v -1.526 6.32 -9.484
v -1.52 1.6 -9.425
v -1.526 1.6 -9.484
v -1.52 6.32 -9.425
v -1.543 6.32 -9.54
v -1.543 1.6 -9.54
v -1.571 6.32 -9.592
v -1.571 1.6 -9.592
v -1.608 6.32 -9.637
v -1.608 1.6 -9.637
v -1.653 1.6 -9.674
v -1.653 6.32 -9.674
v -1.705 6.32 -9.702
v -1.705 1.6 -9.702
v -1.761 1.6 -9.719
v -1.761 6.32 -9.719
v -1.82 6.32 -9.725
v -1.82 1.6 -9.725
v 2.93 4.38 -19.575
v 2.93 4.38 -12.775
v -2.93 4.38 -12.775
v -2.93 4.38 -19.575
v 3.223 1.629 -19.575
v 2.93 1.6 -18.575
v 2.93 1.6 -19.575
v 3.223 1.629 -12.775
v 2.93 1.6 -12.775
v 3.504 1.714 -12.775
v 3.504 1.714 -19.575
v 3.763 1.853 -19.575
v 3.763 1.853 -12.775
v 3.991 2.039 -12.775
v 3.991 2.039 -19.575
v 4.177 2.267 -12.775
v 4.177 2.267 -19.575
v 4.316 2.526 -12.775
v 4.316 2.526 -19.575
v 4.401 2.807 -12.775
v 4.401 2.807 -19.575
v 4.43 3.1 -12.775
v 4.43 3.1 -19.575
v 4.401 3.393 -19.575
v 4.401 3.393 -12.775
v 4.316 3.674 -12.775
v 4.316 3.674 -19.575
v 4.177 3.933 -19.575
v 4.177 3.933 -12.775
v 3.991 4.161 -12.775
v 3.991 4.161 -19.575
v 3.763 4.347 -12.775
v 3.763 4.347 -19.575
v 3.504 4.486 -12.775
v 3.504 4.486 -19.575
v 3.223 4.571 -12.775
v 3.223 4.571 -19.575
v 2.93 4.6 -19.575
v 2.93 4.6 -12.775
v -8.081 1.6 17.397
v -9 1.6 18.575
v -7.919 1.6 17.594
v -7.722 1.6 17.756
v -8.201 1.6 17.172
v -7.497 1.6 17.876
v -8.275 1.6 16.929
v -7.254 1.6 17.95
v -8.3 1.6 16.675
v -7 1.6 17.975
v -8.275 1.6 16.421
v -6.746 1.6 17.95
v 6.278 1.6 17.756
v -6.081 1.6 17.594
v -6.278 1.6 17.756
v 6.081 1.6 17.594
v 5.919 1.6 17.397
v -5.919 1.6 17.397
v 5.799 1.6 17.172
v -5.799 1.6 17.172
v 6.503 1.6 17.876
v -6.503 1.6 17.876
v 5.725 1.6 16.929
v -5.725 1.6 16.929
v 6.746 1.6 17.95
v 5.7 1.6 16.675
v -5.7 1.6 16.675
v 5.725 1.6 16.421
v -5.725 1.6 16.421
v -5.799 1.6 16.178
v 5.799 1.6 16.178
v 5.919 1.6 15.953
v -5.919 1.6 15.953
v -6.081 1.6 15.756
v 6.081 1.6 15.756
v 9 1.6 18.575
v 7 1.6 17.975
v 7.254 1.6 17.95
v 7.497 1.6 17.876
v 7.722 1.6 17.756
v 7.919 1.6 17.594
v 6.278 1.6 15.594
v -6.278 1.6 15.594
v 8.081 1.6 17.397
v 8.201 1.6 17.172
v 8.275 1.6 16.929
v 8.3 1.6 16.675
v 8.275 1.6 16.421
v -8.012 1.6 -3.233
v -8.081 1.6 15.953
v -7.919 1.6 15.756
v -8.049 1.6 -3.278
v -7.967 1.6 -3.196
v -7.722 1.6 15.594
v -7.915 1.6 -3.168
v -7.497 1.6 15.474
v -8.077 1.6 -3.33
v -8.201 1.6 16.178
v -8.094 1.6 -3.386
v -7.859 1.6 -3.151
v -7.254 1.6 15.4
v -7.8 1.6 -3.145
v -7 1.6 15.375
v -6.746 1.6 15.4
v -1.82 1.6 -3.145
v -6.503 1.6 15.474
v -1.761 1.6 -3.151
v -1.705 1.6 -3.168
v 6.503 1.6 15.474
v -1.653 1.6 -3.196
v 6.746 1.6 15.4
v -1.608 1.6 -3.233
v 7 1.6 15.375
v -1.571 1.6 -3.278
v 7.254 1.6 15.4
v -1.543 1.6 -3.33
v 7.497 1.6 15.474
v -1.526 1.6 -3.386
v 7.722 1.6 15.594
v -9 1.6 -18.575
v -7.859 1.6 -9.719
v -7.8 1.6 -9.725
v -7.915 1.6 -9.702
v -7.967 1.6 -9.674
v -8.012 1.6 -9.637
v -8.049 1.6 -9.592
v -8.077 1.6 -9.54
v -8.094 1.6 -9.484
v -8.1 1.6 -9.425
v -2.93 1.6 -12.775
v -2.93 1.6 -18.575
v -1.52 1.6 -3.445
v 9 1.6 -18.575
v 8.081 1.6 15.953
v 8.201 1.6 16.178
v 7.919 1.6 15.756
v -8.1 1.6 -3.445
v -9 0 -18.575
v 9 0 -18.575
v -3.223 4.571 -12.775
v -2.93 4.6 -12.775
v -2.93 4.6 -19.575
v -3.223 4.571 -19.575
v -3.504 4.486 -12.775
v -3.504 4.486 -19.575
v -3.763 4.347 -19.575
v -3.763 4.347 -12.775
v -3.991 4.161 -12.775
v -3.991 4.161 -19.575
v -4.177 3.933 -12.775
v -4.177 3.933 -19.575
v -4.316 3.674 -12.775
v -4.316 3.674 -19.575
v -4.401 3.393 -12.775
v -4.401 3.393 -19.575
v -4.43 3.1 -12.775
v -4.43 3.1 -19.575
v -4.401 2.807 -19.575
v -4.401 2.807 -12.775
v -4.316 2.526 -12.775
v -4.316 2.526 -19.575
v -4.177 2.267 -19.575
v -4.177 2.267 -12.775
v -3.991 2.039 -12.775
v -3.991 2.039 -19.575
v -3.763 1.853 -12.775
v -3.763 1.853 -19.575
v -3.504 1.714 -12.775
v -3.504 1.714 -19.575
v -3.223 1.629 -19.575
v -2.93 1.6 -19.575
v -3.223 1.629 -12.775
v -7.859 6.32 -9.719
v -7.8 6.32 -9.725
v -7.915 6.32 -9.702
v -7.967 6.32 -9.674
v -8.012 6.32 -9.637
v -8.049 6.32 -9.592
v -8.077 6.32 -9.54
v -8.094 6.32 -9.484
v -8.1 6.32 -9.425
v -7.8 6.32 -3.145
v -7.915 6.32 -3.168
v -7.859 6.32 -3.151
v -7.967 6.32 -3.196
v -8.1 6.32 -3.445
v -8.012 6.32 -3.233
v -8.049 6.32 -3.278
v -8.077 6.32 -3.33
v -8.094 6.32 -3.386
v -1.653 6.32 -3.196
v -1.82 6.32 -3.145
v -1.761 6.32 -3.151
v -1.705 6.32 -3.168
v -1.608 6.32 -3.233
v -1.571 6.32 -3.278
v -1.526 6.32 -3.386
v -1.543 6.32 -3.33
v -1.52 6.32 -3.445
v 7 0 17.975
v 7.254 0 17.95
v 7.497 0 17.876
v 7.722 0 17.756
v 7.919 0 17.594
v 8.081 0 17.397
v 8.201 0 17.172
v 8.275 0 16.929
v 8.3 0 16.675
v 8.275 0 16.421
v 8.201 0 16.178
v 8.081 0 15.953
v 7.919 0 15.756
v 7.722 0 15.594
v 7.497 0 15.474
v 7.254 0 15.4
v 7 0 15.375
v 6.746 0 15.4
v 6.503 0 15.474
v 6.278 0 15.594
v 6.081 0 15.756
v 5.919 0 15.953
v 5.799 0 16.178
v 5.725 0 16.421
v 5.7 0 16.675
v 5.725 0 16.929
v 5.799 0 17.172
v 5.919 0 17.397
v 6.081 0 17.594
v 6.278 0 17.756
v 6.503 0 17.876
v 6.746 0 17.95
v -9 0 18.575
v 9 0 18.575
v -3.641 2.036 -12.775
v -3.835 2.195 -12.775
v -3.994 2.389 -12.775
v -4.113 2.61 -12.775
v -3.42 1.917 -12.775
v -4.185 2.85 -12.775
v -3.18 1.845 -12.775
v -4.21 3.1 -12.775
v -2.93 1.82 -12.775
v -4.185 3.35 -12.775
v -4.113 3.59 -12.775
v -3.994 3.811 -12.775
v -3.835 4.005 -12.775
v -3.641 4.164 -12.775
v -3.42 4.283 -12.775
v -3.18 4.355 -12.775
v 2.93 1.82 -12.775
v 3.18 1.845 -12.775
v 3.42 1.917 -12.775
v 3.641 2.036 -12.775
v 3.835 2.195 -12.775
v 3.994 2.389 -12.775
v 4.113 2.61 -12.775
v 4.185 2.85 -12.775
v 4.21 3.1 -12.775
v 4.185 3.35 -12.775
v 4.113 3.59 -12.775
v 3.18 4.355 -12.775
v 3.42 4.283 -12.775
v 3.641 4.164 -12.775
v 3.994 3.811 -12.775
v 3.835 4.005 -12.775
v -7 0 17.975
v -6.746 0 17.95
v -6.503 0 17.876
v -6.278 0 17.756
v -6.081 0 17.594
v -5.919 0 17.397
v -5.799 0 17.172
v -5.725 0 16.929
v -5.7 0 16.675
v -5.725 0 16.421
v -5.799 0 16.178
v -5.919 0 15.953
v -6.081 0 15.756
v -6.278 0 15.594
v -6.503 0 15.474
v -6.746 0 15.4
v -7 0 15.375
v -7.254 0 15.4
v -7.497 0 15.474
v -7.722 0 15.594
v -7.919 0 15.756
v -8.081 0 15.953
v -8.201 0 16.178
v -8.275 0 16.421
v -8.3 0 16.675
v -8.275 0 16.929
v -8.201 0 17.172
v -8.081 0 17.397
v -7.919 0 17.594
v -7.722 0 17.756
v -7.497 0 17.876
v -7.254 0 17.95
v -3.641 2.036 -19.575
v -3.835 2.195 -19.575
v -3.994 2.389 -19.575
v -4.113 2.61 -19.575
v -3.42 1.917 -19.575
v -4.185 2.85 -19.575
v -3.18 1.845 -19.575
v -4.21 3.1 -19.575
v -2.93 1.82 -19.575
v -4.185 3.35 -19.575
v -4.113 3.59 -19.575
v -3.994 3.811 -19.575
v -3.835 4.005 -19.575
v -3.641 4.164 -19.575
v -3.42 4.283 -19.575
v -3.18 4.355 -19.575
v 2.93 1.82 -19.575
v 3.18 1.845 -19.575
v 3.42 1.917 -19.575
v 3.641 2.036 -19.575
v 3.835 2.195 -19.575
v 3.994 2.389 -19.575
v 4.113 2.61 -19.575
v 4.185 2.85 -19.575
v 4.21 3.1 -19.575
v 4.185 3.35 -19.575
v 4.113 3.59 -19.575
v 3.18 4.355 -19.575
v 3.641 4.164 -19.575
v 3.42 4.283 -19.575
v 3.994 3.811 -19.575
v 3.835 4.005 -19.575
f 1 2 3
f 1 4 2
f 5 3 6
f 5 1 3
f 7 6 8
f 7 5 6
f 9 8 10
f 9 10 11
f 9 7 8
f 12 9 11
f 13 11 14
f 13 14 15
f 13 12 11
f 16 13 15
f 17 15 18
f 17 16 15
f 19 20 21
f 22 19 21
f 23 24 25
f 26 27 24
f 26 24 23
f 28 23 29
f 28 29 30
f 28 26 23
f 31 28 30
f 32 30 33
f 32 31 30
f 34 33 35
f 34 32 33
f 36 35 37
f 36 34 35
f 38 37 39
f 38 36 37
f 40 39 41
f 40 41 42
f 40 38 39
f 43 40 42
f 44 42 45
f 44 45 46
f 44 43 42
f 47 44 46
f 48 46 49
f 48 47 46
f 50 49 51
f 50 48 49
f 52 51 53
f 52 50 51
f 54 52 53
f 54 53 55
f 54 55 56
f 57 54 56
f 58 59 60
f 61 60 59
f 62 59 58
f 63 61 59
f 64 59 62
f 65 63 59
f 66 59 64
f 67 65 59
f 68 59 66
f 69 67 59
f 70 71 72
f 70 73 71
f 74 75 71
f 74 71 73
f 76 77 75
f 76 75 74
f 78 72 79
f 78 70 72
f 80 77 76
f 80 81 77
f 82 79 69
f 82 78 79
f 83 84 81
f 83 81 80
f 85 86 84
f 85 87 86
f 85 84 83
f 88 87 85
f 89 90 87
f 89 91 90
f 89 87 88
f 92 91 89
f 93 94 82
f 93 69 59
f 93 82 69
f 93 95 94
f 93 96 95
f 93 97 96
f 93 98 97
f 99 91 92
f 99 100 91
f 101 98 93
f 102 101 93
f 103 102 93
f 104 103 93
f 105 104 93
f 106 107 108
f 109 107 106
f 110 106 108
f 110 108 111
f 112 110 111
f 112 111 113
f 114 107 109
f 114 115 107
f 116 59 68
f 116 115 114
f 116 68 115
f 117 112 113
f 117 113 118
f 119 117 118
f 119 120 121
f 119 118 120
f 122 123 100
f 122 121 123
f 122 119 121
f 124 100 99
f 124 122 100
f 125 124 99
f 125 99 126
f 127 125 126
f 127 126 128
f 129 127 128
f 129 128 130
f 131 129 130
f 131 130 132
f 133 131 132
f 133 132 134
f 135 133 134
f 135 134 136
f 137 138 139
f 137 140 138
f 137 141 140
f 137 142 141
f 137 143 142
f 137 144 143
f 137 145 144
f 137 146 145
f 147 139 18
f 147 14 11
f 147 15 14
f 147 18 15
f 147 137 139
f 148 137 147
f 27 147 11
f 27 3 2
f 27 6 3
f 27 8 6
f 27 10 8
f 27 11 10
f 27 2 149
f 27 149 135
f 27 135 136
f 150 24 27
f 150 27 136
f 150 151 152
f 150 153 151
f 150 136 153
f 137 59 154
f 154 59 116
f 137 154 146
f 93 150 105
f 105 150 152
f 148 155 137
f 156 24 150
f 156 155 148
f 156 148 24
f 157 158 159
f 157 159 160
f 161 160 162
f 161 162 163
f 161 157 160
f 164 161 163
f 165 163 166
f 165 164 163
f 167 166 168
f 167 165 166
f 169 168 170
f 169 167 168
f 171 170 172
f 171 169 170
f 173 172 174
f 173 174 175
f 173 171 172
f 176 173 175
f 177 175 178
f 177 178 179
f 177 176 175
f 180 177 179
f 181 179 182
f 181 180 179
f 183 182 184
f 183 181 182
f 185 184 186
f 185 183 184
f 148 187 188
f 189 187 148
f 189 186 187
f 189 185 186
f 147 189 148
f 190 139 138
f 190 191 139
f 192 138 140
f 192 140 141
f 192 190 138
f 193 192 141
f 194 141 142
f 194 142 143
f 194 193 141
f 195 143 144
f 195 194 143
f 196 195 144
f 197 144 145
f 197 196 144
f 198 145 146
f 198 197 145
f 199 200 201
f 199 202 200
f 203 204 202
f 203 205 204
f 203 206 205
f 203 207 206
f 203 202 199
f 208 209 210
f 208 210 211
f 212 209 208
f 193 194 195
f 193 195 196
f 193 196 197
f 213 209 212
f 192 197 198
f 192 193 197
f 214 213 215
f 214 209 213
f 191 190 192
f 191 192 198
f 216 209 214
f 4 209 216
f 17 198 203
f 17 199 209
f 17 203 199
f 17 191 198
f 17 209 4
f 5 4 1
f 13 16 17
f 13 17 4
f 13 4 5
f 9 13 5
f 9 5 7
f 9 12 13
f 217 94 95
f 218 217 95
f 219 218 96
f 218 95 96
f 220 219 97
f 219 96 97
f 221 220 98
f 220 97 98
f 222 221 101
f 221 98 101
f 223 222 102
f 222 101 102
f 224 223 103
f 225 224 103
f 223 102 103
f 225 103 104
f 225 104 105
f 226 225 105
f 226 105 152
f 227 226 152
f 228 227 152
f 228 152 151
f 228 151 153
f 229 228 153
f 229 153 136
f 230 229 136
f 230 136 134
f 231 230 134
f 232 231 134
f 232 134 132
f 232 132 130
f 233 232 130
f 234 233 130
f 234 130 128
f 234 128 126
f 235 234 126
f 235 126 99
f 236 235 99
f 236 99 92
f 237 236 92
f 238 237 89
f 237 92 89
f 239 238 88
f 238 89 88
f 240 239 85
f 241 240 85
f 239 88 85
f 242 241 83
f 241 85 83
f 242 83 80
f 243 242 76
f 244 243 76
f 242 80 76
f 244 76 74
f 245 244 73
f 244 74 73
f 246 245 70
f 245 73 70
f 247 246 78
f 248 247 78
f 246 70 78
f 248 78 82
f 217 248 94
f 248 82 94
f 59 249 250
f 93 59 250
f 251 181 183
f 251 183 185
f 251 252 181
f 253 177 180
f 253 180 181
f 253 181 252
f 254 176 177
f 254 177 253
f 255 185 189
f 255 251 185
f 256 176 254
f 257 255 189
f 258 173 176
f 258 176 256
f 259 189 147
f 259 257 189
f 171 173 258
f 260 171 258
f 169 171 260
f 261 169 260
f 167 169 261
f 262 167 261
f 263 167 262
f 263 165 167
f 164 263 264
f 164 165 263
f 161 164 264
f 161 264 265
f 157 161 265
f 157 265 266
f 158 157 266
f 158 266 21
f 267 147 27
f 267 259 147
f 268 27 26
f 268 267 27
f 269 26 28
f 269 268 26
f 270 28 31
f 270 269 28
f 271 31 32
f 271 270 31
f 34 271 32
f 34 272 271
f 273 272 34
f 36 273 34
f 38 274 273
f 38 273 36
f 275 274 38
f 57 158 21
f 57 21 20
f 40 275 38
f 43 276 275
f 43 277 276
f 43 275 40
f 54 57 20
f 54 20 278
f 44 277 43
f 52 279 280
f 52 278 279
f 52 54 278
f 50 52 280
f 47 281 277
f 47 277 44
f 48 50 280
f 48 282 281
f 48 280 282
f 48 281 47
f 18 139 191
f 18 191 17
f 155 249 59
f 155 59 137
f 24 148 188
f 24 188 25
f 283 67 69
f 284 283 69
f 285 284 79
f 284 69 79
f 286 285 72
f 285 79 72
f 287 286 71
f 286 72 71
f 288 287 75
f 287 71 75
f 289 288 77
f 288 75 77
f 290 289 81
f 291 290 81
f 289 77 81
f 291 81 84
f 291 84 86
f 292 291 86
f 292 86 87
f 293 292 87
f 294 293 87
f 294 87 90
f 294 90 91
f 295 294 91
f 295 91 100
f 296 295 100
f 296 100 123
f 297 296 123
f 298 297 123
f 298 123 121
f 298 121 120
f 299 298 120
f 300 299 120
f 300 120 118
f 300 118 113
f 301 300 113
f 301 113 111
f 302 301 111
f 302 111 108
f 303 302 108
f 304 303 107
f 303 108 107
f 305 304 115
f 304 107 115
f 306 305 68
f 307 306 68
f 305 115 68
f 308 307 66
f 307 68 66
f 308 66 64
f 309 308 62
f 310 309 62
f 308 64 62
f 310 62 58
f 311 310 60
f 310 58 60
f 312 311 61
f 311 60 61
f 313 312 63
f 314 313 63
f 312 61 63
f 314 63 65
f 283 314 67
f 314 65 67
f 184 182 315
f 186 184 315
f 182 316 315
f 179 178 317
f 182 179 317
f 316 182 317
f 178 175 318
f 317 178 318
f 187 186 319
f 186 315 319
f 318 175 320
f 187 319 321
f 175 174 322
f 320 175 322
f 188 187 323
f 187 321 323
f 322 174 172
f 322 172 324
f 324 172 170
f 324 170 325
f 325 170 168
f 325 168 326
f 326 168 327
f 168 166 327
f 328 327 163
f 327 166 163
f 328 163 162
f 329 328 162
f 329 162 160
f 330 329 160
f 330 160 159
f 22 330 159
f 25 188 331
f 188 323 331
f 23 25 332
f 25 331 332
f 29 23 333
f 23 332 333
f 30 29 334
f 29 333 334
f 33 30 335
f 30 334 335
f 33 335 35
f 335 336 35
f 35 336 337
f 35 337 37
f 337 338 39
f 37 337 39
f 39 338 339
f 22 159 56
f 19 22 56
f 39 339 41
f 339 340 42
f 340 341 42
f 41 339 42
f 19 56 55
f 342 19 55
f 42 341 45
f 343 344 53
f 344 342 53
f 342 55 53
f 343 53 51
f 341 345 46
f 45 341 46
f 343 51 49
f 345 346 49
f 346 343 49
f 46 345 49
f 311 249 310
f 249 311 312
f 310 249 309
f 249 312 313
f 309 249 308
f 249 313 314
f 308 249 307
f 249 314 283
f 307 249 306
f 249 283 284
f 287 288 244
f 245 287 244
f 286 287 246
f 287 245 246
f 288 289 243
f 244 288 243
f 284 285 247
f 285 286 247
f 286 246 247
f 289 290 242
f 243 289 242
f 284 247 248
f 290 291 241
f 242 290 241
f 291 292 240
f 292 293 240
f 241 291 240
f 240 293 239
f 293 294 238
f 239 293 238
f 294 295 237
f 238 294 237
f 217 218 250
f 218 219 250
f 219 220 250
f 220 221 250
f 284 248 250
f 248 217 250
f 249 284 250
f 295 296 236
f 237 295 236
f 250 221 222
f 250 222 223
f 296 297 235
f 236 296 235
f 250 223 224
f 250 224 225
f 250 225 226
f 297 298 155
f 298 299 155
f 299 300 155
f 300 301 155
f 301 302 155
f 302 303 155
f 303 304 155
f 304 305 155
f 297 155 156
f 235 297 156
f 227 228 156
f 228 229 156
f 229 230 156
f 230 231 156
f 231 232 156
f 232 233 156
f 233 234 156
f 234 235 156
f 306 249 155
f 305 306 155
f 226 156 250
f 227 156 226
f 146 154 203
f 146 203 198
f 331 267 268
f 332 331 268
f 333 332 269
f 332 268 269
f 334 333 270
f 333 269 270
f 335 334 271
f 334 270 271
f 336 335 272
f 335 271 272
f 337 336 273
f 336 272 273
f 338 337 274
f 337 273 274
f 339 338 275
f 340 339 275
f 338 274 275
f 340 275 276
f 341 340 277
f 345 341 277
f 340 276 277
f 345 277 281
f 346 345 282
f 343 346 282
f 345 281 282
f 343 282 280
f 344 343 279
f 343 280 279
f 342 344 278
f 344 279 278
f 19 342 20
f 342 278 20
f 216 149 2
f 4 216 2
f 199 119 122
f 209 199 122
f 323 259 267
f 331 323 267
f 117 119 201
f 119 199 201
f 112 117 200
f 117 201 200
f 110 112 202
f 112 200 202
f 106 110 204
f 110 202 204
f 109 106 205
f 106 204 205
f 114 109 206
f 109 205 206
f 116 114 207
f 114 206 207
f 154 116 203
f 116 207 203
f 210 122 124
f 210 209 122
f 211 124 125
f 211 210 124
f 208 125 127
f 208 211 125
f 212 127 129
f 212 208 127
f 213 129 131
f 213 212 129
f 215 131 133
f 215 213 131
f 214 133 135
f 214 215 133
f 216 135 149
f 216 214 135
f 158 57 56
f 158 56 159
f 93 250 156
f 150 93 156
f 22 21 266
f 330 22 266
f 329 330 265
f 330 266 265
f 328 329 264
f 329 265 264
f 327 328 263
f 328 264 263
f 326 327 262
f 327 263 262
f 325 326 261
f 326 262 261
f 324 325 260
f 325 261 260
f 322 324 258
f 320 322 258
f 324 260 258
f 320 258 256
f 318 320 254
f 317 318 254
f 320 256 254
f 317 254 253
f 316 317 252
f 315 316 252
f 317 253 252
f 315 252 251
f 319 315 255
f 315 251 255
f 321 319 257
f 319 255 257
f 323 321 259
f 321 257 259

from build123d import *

# Parameters (mm, degrees)
SKETCH1_W                = 18
SKETCH1_H                = 37.15
BOSS_EXTRUDE1_DEPTH      = 1.6
SKETCH2_R                = 1.3
CUT_EXTRUDE1_DEPTH       = 21.702430413
BOSS_EXTRUDE2_DEPTH      = 1
BOSS_EXTRUDE2_DEPTH_BACK = 5.8
SKETCH4_W                = 6.58
SKETCH4_H                = 6.58
BOSS_EXTRUDE3_DEPTH      = 4.72
FILLET1_R                = 0.3


with BuildPart() as part:
    # Sketch1 → Boss-Extrude1 (new body)
    with BuildSketch(Plane(origin=(0, 0, 0), x_dir=(1, 0, 0), z_dir=(0, 1, 0))):
        Rectangle(SKETCH1_W, SKETCH1_H)
    extrude(amount=BOSS_EXTRUDE1_DEPTH)

    # Sketch2 → Cut-Extrude1 (cut, through all)
    with BuildSketch(Plane(origin=(0, 1.6, 0), x_dir=(1, 0, 0), z_dir=(0, 1, 0))):
        with Locations(Location((-7, -16.675, 0), (0, 0, 270))):
            Circle(SKETCH2_R)
        with Locations(Location((7, -16.675, 0), (0, 0, 270))):
            Circle(SKETCH2_R)
    extrude(amount=-CUT_EXTRUDE1_DEPTH, mode=Mode.SUBTRACT)

    # Sketch3 → Boss-Extrude2 (add, two sides: drawn at the far end of the back side and taken through both)
    with BuildSketch(Plane(origin=(0, 0, -18.575), x_dir=(-1, 0, 0), z_dir=(0, 0, -1)).offset(-BOSS_EXTRUDE2_DEPTH_BACK)):
        with BuildLine():
            Line((2.93, 1.6), (-2.93, 1.6))
            ThreePointArc((-2.93, 1.6), (-4.43, 3.1), (-2.93, 4.6))
            Line((-2.93, 4.6), (2.93, 4.6))
            ThreePointArc((2.93, 4.6), (4.43, 3.1), (2.93, 1.6))
        make_face()
        with BuildLine():
            Line((2.93, 1.82), (-2.93, 1.82))
            ThreePointArc((-2.93, 1.82), (-4.21, 3.1), (-2.93, 4.38))
            Line((-2.93, 4.38), (2.93, 4.38))
            ThreePointArc((2.93, 4.38), (4.21, 3.1), (2.93, 1.82))
        make_face(mode=Mode.SUBTRACT)
    extrude(amount=BOSS_EXTRUDE2_DEPTH + BOSS_EXTRUDE2_DEPTH_BACK)

    # Sketch4 → Boss-Extrude3 (add)
    with BuildSketch(Plane(origin=(0, 1.6, 0), x_dir=(1, 0, 0), z_dir=(0, 1, 0))):
        with Locations((-4.81, 6.435)):
            Rectangle(SKETCH4_W, SKETCH4_H)
    extrude(amount=BOSS_EXTRUDE3_DEPTH)

    # Fillet1
    fillet1_edges = [part.edges().sort_by_distance(p)[0] for p in [
        (-1.52, 3.96, -3.145),
        (-1.52, 3.96, -9.725),
        (-8.1, 3.96, -9.725),
        (-8.1, 3.96, -3.145),
    ]]
    fillet(fillet1_edges, radius=FILLET1_R)


solid = part.part
